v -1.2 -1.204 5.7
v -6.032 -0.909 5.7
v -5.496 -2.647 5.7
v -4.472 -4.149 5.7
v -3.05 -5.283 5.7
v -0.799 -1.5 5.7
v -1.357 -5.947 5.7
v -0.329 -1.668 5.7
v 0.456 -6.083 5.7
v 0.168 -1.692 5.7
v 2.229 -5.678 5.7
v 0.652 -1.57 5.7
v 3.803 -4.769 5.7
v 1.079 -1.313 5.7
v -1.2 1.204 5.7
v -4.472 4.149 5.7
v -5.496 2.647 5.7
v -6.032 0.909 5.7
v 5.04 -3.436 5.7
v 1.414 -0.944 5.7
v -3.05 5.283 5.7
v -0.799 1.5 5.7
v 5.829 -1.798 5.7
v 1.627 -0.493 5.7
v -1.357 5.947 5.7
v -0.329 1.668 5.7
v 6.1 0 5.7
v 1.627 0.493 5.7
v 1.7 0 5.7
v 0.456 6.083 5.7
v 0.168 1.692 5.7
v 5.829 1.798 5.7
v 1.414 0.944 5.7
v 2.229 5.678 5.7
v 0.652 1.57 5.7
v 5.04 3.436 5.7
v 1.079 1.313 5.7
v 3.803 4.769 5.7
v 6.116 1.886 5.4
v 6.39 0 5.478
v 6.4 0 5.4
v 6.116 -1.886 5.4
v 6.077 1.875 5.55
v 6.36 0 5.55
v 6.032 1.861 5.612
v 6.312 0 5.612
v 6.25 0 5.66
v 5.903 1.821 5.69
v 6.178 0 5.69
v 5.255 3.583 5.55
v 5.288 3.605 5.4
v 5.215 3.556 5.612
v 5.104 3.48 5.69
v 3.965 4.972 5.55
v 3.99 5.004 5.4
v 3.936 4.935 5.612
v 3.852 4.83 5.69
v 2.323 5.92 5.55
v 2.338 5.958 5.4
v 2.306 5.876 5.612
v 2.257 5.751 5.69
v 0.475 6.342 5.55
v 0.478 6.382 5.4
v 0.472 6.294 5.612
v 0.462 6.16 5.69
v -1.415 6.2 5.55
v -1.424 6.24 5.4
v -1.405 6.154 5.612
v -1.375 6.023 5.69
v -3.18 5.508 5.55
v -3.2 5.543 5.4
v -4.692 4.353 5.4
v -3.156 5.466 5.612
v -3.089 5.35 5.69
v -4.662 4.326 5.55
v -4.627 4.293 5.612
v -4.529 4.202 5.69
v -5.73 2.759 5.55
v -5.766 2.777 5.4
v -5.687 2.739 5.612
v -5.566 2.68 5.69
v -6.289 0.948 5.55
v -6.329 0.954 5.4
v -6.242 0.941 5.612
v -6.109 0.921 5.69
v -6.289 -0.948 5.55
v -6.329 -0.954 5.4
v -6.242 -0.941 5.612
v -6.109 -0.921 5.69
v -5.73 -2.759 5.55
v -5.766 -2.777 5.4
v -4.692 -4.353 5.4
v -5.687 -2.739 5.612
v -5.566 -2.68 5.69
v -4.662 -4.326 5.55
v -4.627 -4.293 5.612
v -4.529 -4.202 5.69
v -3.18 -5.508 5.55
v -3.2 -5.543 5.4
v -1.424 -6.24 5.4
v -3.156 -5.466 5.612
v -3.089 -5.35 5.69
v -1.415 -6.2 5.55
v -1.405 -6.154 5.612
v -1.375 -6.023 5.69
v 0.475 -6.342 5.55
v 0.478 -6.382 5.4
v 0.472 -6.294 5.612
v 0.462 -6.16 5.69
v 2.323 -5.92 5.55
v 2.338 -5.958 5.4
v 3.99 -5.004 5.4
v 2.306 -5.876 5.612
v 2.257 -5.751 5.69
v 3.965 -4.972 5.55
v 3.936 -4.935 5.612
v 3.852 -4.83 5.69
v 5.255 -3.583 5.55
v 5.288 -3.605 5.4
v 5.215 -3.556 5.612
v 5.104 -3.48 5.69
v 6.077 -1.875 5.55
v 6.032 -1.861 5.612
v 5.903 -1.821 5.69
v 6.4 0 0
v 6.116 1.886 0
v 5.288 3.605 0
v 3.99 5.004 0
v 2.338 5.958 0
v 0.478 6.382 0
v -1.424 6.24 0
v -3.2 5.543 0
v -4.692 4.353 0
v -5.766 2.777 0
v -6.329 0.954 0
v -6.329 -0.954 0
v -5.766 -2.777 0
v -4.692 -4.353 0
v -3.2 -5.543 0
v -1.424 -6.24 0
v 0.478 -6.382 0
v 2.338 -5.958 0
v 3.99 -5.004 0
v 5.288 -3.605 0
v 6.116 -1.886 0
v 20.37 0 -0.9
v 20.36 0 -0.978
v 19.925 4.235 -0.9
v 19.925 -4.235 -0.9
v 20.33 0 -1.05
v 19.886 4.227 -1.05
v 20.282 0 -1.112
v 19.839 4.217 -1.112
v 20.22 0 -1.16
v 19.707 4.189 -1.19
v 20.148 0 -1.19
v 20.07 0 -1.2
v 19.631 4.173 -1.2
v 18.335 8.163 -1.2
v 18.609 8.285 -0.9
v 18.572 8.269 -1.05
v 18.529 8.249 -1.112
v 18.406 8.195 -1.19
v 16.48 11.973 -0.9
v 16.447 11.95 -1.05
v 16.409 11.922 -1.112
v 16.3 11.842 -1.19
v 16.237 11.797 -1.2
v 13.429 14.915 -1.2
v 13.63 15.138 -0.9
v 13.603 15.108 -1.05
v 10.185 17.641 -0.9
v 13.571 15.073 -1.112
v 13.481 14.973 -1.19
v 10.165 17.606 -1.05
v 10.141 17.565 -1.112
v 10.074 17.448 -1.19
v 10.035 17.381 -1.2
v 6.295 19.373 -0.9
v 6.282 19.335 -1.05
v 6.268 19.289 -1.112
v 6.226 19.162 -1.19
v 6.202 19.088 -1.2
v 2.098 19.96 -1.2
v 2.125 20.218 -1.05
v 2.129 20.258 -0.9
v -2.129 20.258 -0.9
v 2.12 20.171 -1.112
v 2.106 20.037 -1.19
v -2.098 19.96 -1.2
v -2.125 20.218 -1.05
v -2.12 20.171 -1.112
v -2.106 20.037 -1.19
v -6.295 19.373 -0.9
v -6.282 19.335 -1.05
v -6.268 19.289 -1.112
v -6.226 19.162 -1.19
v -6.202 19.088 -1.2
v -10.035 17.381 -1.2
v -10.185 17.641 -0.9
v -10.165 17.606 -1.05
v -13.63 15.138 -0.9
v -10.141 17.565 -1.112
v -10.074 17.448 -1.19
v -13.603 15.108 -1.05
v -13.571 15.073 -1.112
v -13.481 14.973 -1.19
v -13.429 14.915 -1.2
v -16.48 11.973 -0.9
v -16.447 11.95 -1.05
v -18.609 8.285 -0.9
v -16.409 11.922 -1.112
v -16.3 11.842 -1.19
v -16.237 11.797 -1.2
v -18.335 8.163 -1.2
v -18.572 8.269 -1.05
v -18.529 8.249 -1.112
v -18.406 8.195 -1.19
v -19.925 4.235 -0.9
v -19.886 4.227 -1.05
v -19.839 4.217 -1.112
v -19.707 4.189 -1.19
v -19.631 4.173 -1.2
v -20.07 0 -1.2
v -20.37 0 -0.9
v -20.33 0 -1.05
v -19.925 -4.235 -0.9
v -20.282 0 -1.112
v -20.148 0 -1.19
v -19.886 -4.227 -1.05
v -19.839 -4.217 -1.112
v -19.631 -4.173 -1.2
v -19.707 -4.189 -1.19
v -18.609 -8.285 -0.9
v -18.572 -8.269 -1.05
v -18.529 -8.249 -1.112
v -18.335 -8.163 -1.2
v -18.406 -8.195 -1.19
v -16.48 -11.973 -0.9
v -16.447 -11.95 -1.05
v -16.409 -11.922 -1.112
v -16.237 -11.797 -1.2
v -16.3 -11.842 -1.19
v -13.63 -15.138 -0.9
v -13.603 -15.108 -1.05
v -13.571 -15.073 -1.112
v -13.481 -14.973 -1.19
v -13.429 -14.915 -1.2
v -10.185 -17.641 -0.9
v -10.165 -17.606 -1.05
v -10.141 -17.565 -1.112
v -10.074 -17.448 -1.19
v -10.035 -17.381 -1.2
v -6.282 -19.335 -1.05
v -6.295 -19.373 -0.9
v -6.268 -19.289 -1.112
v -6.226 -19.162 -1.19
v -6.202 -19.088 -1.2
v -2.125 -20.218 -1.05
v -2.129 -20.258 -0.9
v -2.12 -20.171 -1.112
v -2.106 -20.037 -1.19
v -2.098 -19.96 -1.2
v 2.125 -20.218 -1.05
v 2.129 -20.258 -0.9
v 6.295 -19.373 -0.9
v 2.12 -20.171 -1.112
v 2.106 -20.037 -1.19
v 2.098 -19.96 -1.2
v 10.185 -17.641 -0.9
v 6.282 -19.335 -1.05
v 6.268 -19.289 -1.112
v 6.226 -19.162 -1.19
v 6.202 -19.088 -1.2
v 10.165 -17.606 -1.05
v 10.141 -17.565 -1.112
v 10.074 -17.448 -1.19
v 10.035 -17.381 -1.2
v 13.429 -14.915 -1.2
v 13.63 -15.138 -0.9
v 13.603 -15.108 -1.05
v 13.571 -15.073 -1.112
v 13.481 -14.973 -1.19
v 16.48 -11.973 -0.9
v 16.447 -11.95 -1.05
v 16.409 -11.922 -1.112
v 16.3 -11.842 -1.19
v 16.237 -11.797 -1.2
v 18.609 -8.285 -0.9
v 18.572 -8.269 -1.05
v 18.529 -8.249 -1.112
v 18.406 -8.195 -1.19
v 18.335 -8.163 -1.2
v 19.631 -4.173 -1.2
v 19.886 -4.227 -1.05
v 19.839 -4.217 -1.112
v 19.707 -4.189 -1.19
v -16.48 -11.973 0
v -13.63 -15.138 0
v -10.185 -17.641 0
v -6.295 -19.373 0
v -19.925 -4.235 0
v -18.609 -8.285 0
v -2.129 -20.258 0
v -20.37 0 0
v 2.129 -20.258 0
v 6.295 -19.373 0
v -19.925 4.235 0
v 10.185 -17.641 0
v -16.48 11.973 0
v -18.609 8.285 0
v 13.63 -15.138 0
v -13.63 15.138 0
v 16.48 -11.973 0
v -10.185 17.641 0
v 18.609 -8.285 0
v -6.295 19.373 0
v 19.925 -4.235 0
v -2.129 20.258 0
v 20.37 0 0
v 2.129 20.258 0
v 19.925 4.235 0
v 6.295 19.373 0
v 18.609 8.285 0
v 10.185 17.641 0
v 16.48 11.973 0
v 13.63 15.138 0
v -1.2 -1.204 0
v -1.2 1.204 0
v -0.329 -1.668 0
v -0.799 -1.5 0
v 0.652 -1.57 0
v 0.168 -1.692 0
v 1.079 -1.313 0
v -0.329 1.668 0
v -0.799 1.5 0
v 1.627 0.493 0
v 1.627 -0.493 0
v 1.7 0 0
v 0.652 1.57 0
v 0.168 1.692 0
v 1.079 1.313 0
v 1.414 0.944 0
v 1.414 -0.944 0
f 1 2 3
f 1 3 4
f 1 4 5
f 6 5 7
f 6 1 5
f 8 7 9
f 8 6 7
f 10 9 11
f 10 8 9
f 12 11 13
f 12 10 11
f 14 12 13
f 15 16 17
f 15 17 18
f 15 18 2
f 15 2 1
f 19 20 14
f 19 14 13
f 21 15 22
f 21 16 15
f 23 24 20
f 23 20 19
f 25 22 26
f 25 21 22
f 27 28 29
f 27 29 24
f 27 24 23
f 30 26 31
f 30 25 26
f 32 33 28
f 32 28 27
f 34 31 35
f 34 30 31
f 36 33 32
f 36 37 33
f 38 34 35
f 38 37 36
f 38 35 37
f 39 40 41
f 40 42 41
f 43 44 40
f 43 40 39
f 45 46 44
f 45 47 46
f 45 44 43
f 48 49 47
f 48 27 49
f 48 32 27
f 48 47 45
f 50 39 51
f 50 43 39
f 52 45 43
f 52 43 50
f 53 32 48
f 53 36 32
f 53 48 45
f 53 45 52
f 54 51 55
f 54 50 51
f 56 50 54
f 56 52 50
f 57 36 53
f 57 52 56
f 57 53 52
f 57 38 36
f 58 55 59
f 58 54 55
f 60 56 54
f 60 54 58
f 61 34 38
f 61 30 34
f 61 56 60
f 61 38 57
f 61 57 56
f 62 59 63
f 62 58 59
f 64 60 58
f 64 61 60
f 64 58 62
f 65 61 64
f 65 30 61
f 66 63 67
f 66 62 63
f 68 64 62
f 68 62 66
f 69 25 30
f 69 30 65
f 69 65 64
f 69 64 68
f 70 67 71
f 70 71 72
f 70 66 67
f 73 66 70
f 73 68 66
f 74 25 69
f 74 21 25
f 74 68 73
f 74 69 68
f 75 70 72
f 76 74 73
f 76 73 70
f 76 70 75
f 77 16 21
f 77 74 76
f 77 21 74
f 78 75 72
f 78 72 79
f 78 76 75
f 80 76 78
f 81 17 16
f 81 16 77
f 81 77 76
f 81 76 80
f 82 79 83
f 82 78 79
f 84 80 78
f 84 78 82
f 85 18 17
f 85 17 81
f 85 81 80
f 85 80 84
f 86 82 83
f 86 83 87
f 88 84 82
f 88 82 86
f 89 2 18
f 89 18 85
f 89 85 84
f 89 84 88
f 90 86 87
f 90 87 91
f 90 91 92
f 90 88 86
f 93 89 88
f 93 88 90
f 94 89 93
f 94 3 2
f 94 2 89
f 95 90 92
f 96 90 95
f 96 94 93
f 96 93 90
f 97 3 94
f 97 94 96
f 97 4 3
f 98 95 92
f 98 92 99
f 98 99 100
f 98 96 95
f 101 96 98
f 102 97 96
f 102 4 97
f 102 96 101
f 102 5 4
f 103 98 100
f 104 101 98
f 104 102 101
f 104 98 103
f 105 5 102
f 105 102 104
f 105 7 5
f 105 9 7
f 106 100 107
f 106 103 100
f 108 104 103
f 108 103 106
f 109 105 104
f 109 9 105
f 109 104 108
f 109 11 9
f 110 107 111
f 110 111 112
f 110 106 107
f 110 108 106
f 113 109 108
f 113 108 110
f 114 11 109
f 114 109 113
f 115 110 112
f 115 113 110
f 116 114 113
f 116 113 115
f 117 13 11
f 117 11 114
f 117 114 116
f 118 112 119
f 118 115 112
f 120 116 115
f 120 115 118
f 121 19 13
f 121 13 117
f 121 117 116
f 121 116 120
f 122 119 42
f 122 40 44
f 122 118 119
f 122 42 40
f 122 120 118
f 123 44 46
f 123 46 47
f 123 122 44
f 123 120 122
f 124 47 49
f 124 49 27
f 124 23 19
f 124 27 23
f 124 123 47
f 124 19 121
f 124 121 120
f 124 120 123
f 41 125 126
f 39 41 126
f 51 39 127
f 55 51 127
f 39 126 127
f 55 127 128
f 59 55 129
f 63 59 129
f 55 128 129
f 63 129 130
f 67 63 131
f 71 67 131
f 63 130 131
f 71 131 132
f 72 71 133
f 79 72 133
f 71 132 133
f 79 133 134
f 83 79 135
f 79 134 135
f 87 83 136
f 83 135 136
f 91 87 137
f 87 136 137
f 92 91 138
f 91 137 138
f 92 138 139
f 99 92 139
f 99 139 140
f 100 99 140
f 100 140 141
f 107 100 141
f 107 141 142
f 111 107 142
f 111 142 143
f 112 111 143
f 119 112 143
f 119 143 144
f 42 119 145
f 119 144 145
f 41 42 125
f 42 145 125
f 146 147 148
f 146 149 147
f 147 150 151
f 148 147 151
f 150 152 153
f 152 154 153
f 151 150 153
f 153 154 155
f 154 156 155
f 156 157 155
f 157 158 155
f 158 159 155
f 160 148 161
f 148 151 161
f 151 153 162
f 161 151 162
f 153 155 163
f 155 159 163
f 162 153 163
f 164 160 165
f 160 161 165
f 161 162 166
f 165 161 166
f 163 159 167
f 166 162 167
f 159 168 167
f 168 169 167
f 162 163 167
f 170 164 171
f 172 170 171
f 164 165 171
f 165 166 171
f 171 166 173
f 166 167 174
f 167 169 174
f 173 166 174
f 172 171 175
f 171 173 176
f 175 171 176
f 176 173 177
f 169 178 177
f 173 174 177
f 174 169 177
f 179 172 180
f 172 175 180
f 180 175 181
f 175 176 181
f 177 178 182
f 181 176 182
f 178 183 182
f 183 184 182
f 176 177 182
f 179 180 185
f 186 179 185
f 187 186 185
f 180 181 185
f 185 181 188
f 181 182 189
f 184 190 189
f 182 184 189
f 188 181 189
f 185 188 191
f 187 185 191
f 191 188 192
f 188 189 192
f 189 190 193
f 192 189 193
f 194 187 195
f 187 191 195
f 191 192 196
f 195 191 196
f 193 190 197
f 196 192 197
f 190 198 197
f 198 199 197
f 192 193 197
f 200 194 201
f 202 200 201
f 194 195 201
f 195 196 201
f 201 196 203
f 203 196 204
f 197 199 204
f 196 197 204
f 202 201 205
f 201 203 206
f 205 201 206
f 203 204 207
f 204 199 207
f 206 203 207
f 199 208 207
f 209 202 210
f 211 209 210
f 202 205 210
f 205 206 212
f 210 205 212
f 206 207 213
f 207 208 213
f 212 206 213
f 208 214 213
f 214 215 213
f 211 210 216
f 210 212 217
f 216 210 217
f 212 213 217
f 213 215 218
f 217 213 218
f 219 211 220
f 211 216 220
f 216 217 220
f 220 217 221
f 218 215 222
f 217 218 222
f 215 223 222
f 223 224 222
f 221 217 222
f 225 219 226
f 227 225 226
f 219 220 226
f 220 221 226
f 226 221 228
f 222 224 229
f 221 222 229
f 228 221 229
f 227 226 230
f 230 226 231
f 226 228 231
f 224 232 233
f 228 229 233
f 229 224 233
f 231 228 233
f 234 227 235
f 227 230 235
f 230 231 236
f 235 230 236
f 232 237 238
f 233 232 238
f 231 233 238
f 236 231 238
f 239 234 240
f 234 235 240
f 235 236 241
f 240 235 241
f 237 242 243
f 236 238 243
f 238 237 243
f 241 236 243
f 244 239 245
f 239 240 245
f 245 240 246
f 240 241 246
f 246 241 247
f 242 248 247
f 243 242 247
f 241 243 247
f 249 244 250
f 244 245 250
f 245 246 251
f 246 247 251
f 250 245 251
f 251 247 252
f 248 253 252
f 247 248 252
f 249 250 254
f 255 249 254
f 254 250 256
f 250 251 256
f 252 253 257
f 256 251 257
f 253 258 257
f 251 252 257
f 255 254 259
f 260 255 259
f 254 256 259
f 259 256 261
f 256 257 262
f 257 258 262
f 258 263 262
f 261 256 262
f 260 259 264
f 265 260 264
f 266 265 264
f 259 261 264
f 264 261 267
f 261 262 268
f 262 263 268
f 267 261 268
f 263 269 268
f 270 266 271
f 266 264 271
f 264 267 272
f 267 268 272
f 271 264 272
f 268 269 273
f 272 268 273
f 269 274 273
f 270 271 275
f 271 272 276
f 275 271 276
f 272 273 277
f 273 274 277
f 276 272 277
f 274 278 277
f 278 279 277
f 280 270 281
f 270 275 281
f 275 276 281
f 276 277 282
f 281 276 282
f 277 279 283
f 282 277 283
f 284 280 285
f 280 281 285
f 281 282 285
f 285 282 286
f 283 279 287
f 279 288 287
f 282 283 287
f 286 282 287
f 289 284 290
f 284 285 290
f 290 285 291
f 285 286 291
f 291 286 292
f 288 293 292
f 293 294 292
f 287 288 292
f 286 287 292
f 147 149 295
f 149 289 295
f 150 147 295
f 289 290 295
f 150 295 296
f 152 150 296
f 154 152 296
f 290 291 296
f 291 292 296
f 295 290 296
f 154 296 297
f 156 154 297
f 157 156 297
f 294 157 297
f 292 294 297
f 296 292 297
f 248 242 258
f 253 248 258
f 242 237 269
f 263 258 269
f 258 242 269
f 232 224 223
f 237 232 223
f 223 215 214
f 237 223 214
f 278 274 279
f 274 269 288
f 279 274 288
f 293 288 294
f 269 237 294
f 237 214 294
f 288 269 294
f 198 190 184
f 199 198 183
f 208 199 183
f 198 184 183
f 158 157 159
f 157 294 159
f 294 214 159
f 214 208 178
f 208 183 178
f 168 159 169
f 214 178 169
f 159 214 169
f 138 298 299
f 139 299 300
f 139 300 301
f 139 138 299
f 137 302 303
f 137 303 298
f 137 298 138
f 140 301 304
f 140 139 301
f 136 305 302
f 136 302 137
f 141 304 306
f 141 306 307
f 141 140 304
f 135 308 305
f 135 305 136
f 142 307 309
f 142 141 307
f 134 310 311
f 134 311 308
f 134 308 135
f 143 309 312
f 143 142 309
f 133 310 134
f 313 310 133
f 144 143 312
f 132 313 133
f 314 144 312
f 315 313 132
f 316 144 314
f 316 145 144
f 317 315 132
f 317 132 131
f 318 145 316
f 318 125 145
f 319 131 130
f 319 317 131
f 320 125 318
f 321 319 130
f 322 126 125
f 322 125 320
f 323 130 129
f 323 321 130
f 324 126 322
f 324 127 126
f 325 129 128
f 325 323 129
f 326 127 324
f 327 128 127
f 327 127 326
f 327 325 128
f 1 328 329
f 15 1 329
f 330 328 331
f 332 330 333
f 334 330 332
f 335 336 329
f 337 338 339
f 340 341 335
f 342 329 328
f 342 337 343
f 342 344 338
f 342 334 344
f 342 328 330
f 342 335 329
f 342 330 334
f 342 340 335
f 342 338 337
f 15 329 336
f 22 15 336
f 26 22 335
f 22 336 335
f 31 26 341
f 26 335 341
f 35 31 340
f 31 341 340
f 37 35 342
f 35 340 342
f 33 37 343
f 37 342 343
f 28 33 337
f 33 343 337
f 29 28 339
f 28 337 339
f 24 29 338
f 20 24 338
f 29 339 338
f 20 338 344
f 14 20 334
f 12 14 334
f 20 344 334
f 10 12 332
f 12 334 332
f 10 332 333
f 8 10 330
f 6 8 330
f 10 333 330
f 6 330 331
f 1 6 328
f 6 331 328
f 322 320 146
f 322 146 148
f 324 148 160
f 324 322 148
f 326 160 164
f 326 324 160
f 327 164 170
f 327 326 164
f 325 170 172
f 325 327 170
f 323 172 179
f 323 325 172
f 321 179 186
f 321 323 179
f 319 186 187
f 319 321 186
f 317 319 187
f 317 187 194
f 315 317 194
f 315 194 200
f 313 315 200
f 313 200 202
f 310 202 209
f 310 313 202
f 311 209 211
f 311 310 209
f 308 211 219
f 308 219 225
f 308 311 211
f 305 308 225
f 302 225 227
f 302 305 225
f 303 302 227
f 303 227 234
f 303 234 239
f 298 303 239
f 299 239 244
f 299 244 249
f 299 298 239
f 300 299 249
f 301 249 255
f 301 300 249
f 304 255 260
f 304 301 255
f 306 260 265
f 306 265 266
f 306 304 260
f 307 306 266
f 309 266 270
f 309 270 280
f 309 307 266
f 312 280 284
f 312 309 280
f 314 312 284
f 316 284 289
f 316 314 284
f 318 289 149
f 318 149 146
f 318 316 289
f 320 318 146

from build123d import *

# Parameters (mm, degrees)
F0_R     = 20.37
F0_R_2   = 6.4
F1_DEPTH = 1.2
F2_DEPTH = 5.7
F3_R     = 0.3


with BuildPart() as f1:
    # F0 (on Top) → F1 (new body)
    with BuildSketch(Plane.XY):
        Circle(F0_R)
        Circle(F0_R_2, mode=Mode.SUBTRACT)
        Circle(F0_R_2)
        with BuildLine():
            ThreePointArc((-1.2, 1.2041594579), (1.7, 0), (-1.2, -1.2041594579))
            Line((-1.2, -1.2041594579), (-1.2, 1.2041594579))
        make_face(mode=Mode.SUBTRACT)
        with BuildLine():
            Line((-1.2, 1.2041594579), (-1.2, -1.2041594579))
            ThreePointArc((-1.2, -1.2041594579), (1.7, 0), (-1.2, 1.2041594579))
        make_face()
    extrude(amount=-F1_DEPTH)

    # F0 (on Top) → F2 (join)
    with BuildSketch(Plane.XY):
        Circle(F0_R_2)
        with BuildLine():
            ThreePointArc((-1.2, 1.2041594579), (1.7, 0), (-1.2, -1.2041594579))
            Line((-1.2, -1.2041594579), (-1.2, 1.2041594579))
        make_face(mode=Mode.SUBTRACT)
    extrude(amount=F2_DEPTH)

    # F3
    f3_edges = [f1.edges().sort_by_distance(p)[0] for p in [
        (-20.37, 0, -1.2),
        (-6.4, 0, 5.7),
    ]]
    fillet(f3_edges, radius=F3_R)


solid = f1.part
